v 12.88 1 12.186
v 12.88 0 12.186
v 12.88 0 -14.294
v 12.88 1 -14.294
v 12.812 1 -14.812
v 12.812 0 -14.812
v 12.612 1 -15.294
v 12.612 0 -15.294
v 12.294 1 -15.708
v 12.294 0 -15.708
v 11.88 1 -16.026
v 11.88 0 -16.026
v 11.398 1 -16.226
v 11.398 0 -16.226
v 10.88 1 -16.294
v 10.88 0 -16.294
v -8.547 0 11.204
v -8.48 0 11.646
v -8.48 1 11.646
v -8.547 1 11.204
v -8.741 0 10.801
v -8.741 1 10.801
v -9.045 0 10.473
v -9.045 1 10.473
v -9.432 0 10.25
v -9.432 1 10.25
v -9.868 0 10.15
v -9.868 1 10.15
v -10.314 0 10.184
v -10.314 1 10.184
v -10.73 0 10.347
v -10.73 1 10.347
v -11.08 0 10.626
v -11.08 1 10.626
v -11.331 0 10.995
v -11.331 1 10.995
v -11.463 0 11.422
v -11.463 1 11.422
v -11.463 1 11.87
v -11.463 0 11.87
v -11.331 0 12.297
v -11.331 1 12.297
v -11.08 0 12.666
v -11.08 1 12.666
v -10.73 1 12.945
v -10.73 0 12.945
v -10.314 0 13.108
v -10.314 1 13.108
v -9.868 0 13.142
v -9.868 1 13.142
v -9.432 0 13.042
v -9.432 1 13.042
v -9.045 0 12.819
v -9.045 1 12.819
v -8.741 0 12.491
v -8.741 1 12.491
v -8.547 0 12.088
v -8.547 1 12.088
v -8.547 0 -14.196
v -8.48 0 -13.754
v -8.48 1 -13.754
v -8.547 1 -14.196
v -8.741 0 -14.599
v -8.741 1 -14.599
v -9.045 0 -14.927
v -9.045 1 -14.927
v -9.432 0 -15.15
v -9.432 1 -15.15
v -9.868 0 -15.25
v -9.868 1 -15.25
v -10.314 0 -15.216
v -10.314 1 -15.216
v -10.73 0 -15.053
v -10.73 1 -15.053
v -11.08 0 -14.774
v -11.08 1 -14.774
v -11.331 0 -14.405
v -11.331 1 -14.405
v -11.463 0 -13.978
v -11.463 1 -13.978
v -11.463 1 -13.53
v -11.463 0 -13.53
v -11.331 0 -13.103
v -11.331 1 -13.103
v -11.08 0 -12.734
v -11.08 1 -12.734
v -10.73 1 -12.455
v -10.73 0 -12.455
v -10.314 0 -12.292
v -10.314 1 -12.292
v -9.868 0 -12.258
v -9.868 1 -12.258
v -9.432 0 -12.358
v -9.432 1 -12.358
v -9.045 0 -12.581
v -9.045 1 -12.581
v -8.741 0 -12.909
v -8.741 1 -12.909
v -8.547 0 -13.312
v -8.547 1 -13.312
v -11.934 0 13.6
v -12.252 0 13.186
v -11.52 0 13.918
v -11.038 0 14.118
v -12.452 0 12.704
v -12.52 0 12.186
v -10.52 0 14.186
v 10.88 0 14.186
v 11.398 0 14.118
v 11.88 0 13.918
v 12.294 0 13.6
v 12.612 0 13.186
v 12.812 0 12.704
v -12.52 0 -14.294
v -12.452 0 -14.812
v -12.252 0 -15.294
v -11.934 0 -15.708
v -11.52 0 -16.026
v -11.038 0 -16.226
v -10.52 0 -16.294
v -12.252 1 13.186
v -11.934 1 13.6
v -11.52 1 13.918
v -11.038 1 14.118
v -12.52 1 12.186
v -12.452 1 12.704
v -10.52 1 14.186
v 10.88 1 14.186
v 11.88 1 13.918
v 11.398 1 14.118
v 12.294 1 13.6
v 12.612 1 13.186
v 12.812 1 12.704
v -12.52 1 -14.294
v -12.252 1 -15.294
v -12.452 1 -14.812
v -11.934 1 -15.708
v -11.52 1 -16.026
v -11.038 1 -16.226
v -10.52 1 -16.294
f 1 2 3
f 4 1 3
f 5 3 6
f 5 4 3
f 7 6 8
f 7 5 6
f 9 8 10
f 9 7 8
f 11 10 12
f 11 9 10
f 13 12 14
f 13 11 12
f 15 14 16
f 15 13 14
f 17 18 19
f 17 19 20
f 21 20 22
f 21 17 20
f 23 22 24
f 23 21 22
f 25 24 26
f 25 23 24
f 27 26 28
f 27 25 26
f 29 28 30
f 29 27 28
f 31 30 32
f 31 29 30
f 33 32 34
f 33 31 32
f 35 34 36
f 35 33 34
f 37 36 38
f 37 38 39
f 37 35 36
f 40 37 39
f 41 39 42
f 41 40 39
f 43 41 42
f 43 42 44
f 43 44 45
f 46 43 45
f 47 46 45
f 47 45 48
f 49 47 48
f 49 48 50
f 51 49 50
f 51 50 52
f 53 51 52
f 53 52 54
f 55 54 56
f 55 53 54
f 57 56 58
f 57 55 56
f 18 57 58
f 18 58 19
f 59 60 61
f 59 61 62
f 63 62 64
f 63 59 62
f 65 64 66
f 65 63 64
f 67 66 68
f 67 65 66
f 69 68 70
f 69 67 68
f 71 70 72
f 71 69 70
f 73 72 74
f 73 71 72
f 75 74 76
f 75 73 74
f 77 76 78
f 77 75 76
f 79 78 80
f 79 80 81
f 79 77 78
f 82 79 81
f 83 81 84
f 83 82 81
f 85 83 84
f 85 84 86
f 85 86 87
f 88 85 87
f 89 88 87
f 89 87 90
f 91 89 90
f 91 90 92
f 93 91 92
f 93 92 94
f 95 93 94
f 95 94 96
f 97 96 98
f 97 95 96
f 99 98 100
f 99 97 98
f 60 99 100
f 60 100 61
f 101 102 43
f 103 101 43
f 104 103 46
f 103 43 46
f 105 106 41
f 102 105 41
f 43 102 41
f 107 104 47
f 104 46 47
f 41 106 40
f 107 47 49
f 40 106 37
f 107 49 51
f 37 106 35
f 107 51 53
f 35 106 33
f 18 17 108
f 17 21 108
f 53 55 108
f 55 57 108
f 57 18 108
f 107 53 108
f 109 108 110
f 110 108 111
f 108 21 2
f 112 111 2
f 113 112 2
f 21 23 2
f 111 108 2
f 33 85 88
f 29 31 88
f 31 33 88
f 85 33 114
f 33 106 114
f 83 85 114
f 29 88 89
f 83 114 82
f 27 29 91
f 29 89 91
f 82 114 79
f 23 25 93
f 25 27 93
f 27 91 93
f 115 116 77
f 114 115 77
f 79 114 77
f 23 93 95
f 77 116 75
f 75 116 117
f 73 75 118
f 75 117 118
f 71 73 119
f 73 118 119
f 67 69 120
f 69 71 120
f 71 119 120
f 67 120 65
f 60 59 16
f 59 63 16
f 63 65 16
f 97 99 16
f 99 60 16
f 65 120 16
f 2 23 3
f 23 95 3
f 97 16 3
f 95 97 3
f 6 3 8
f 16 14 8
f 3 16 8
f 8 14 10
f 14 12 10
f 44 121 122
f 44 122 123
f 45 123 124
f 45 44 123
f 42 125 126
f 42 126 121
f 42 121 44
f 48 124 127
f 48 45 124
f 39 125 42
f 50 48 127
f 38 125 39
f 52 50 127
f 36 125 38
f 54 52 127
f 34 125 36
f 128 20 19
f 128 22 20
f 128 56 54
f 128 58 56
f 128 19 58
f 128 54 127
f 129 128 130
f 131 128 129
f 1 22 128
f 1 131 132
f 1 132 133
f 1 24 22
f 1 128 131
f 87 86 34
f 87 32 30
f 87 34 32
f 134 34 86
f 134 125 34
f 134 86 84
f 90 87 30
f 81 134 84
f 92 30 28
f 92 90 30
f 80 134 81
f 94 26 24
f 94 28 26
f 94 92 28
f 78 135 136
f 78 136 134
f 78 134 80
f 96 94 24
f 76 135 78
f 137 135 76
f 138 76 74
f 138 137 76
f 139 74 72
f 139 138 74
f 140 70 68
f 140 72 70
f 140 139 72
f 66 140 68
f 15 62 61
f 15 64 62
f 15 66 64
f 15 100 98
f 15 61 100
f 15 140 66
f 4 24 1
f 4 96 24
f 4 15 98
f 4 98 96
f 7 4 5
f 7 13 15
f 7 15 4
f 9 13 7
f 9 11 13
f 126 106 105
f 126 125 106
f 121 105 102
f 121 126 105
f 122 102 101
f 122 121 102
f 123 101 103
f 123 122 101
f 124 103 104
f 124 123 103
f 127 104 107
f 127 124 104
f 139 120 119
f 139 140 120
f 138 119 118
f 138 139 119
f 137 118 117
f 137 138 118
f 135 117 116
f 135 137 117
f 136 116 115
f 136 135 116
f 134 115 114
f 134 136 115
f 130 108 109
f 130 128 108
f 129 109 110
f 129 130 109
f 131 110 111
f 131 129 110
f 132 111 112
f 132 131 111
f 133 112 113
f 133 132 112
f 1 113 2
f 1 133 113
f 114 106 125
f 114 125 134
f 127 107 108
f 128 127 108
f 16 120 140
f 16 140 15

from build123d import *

# Parameters (mm, degrees)
SKETCH1_W           = 25.4
SKETCH1_H           = 30.48
SKETCH1_R           = 1.5
BOSS_EXTRUDE1_DEPTH = 1
FILLET1_R           = 2
FILLET2_R           = 2
FILLET3_R           = 2
FILLET4_R           = 2


with BuildPart() as part:
    # Sketch1 → Boss-Extrude1 (new body)
    with BuildSketch(Plane(origin=(0, 0, 0), x_dir=(1, 0, 0), z_dir=(0, 1, 0))):
        with Locations((0.180037034, 1.054001786)):
            Rectangle(SKETCH1_W, SKETCH1_H)
        with Locations((-9.979962966, 13.754001786)):
            Circle(SKETCH1_R, mode=Mode.SUBTRACT)
        with Locations((-9.979962966, -11.645998214)):
            Circle(SKETCH1_R, mode=Mode.SUBTRACT)
    extrude(amount=BOSS_EXTRUDE1_DEPTH)

    # Fillet1
    fillet1_edges = [part.edges().sort_by_distance(p)[0] for p in [
        (-12.519962966, 0.5, 14.185998214),
    ]]
    fillet(fillet1_edges, radius=FILLET1_R)

    # Fillet2
    fillet2_edges = [part.edges().sort_by_distance(p)[0] for p in [
        (12.880037034, 0.5, 14.185998214),
    ]]
    fillet(fillet2_edges, radius=FILLET2_R)

    # Fillet3
    fillet3_edges = [part.edges().sort_by_distance(p)[0] for p in [
        (12.880037034, 0.5, -16.294001786),
    ]]
    fillet(fillet3_edges, radius=FILLET3_R)

    # Fillet4
    fillet4_edges = [part.edges().sort_by_distance(p)[0] for p in [
        (-12.519962966, 0.5, -16.294001786),
    ]]
    fillet(fillet4_edges, radius=FILLET4_R)


solid = part.part
